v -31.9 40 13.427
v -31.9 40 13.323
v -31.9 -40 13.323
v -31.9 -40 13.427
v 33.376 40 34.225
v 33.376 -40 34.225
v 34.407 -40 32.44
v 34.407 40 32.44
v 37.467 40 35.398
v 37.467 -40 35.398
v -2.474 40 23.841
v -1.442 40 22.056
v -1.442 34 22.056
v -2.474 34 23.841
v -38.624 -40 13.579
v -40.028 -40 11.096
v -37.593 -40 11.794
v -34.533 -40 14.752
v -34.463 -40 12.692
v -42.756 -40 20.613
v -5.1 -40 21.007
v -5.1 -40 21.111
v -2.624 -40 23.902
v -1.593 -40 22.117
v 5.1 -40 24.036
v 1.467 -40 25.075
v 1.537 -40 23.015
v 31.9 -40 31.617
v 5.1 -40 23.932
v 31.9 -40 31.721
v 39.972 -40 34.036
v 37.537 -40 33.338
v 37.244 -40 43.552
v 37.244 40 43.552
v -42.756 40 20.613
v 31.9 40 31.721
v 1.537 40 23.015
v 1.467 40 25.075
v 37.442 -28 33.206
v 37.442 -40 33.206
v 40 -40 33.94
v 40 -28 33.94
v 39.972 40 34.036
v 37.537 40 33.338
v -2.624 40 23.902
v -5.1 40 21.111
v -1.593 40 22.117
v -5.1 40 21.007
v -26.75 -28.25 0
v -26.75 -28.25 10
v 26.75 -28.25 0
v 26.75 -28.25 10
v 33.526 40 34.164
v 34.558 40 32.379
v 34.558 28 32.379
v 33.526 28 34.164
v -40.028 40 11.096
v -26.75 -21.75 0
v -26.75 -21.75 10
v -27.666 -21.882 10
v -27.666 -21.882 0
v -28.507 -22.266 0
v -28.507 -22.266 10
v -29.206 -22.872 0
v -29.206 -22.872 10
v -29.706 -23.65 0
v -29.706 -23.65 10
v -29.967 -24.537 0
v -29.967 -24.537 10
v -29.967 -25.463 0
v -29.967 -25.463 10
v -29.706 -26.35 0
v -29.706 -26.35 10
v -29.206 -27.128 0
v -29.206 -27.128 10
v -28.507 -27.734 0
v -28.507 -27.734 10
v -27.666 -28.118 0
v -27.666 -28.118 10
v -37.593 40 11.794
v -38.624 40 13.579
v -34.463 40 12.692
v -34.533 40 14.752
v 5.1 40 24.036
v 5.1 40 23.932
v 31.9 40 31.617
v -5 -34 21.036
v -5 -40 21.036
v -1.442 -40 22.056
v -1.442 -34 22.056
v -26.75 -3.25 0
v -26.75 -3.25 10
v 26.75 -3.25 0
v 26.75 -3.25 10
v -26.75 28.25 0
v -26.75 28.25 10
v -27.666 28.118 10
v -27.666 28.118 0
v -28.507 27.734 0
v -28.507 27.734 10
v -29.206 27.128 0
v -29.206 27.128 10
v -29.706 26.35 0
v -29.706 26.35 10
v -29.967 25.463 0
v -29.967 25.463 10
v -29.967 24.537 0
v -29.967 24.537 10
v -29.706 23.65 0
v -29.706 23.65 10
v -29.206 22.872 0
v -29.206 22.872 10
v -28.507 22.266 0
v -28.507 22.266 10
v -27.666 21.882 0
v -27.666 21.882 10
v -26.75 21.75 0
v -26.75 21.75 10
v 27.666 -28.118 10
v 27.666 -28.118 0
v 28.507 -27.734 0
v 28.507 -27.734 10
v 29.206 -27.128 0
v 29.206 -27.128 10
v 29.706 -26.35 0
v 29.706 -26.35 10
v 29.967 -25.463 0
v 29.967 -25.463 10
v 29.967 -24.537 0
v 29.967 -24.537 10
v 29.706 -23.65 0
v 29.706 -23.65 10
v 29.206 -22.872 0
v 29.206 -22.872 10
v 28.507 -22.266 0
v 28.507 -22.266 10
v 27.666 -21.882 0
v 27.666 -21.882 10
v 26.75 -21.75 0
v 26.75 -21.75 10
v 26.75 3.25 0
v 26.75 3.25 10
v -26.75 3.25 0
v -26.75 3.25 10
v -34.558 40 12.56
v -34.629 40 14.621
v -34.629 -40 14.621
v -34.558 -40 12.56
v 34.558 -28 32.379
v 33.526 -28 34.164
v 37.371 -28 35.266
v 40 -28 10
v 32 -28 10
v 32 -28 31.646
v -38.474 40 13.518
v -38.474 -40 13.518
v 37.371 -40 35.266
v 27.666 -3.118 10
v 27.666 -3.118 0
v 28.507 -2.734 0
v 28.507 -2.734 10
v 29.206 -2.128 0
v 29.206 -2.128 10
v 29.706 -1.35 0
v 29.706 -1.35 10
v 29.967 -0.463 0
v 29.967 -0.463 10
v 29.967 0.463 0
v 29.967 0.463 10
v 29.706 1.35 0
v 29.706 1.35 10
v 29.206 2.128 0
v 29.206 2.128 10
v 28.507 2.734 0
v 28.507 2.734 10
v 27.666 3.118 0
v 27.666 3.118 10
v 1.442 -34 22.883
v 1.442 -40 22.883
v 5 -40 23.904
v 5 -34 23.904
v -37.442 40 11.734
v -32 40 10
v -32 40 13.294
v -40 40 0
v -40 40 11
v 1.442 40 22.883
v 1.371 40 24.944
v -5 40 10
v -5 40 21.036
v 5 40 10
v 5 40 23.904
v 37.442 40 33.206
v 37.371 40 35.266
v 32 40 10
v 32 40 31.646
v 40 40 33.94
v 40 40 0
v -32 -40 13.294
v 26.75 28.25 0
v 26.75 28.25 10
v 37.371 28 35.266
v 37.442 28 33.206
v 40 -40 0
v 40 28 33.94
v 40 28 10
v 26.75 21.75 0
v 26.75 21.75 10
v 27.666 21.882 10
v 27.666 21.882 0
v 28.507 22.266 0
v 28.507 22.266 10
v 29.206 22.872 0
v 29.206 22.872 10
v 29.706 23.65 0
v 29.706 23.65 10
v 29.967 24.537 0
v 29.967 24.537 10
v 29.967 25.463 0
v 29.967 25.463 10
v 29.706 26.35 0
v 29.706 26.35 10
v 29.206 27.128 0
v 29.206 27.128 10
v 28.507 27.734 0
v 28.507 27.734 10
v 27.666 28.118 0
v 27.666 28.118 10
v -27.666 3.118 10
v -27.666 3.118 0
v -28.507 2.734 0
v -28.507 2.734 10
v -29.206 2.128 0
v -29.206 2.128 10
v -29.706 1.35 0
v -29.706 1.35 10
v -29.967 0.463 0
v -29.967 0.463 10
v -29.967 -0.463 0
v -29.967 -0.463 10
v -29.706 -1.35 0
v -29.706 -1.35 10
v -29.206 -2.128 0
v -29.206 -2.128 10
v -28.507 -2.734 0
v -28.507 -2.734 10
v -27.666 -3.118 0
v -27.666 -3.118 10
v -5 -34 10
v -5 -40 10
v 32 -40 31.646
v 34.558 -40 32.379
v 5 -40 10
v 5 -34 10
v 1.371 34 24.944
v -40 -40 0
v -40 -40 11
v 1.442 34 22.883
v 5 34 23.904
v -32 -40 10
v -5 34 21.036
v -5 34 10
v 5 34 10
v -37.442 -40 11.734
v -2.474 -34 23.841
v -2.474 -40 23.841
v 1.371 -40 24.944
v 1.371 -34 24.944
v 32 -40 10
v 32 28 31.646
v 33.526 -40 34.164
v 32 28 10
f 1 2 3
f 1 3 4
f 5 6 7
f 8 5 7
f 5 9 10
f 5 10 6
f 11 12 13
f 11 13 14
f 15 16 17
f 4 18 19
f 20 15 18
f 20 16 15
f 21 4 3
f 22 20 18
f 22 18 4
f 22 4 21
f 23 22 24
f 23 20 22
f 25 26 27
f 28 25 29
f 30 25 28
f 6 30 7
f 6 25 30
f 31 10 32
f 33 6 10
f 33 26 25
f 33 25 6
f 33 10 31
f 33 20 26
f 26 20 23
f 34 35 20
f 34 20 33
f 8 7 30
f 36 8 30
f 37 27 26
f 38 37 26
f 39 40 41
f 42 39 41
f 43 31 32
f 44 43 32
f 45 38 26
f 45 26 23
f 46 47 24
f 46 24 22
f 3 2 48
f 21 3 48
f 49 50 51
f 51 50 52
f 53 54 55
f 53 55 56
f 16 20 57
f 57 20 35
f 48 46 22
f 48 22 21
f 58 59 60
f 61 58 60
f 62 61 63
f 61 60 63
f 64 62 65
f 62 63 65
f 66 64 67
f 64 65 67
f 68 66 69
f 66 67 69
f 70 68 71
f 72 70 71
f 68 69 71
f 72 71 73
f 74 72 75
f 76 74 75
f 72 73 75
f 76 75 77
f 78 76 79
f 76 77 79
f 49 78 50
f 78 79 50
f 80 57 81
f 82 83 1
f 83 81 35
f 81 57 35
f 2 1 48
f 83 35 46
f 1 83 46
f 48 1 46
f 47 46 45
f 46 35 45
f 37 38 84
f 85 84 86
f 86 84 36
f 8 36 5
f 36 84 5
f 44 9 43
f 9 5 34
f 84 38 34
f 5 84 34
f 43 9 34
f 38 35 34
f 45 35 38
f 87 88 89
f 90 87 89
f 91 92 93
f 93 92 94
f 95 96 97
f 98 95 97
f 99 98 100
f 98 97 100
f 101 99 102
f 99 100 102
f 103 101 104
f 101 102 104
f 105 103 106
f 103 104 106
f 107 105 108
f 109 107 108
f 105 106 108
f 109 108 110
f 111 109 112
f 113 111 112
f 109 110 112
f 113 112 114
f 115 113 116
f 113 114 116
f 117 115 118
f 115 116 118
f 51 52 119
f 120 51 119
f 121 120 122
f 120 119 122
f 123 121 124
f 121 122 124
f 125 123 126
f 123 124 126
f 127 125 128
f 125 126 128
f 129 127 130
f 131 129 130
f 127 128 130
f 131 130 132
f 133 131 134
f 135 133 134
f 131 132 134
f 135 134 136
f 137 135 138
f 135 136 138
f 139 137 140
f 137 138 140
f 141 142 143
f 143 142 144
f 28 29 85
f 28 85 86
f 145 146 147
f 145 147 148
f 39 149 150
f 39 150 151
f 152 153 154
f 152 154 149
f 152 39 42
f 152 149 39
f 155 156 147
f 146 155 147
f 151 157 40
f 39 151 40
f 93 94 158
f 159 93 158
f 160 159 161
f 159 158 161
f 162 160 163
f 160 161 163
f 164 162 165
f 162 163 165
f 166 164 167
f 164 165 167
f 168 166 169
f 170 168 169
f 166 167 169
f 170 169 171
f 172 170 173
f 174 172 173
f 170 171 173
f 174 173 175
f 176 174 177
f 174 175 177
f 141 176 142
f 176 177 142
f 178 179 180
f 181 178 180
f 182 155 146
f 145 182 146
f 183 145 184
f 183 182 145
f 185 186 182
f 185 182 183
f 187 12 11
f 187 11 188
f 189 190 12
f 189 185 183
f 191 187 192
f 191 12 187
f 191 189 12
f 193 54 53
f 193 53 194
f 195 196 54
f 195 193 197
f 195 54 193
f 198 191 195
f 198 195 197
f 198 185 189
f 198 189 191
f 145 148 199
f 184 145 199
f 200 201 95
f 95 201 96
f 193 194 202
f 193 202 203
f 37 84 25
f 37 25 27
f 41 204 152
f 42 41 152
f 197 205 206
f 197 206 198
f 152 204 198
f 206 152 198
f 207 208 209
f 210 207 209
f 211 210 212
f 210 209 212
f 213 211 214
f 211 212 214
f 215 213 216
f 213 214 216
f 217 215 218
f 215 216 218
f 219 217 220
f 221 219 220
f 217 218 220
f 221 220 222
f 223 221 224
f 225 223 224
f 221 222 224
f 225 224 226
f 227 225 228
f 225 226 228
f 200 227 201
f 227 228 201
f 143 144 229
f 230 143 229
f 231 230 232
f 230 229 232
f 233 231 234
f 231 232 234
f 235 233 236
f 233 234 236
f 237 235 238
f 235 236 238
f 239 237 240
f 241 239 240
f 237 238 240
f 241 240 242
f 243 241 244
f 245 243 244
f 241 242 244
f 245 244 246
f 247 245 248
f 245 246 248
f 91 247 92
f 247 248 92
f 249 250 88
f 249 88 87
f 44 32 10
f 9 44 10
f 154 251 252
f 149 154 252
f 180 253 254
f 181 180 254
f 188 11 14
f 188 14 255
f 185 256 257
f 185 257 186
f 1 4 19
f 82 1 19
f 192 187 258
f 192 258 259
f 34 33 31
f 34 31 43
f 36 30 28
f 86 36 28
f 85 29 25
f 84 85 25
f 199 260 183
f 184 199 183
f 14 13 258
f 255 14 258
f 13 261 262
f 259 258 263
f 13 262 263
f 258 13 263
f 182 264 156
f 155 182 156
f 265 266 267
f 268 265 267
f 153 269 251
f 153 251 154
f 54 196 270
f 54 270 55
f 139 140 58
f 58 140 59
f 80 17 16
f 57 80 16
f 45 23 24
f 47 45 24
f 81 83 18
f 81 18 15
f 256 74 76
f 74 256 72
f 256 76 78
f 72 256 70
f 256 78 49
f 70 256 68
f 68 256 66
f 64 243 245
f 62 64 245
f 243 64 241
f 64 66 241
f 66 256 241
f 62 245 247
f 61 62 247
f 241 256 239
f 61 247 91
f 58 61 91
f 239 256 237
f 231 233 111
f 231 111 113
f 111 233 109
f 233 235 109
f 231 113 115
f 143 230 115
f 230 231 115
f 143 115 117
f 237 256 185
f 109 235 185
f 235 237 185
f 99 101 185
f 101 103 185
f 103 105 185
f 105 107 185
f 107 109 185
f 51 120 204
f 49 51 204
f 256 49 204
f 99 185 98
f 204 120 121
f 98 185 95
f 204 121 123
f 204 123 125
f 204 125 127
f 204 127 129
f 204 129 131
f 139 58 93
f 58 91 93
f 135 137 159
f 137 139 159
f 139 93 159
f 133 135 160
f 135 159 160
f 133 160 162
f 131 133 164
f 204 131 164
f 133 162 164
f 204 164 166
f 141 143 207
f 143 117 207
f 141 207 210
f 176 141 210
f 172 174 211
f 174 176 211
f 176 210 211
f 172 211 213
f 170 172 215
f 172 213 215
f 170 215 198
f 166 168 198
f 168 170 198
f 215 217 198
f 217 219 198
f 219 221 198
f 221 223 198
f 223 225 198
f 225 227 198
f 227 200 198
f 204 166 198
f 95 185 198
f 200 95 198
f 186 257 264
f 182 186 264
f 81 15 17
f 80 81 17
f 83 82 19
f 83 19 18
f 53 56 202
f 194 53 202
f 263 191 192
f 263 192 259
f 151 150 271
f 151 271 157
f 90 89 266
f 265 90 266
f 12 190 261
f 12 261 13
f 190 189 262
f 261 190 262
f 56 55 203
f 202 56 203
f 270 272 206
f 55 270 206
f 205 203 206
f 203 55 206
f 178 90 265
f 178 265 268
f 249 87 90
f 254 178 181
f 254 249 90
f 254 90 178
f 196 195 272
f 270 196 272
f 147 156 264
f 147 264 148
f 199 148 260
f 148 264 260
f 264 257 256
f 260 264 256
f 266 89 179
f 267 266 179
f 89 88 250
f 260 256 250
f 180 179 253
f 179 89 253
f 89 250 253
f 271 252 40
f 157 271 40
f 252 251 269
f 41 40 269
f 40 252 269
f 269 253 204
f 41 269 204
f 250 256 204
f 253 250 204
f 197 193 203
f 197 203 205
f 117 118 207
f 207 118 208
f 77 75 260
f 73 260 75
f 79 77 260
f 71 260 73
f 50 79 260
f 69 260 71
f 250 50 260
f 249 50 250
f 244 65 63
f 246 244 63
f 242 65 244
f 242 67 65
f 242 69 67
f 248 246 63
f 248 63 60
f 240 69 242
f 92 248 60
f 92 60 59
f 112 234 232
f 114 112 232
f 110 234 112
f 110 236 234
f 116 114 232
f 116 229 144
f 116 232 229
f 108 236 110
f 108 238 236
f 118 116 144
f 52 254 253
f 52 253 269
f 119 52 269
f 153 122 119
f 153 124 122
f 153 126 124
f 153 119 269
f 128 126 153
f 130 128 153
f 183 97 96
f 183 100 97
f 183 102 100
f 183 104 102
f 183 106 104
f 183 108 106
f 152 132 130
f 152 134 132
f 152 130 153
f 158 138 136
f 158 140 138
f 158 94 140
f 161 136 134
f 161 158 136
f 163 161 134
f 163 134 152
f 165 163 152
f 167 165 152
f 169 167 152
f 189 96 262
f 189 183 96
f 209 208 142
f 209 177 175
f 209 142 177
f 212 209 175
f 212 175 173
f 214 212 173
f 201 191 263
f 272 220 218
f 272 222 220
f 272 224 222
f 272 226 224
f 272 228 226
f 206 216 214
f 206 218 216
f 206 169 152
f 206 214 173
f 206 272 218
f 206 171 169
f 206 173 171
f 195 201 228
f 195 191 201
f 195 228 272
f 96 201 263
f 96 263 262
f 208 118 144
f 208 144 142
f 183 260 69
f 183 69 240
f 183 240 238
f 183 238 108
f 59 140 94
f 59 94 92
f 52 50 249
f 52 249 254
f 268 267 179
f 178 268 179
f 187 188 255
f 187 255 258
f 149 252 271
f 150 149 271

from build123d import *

# Parameters (mm, degrees)
F0_W      = 80
F0_H      = 80
F1_DEPTH  = 10
F3_DEPTH  = 10
F4_W      = 8
F4_H      = 80
F4_W_2    = 10
F4_H_2    = 6
F4_H_3    = 12
F5_DEPTH  = 80
F7_DEPTH  = 80.001
F10_W     = 83.2239548689
F10_H     = 80
F11_DEPTH = 10
F13_DEPTH = 80.001


with BuildPart() as f1:
    # F0 (on Top) → F1 (new body)
    with BuildSketch(Plane.XY):
        Rectangle(F0_W, F0_H)
    extrude(amount=F1_DEPTH)

    # F2 (on face) → F3 (cut, through all)
    with BuildSketch(Plane.XY.offset(10)):
        with BuildLine():
            ThreePointArc((-26.75, 28.25), (-30, 25), (-26.75, 21.75))
            Line((-26.75, 21.75), (26.75, 21.75))
            ThreePointArc((26.75, 21.75), (30, 25), (26.75, 28.25))
            Line((26.75, 28.25), (-26.75, 28.25))
        make_face()
        with BuildLine():
            Line((26.75, 3.25), (-26.75, 3.25))
            ThreePointArc((-26.75, 3.25), (-30, 0), (-26.75, -3.25))
            Line((-26.75, -3.25), (26.75, -3.25))
            ThreePointArc((26.75, -3.25), (30, 0), (26.75, 3.25))
        make_face()
        with BuildLine():
            Line((26.75, -21.75), (-26.75, -21.75))
            ThreePointArc((-26.75, -21.75), (-30, -25), (-26.75, -28.25))
            Line((-26.75, -28.25), (26.75, -28.25))
            ThreePointArc((26.75, -28.25), (30, -25), (26.75, -21.75))
        make_face()
    extrude(amount=-F3_DEPTH, mode=Mode.SUBTRACT)

    # F4 (on face) → F5 (join)
    with BuildSketch(Plane.XY.offset(10)):
        with Locations((-36, 0)):
            Rectangle(F4_W, F4_H)
        with Locations((0, -37)):
            Rectangle(F4_W_2, F4_H_2)
        with Locations((36, -34)):
            Rectangle(F4_W, F4_H_3)
    extrude(amount=F5_DEPTH)

    # F6 (on face) → F7 (cut, through all)
    with BuildSketch(Plane.XZ.offset(40)):
        Polygon((40, 33.9396308607), (62.9050343134, 40.5075437607), (62.9050343134, 116.6192118451), (-43.2359185175, 116.6192118451), (-43.4874144438, 10), (-40, 11), (-37.4418925439, 11.7335255093), (-38.4737981035, 13.5182302233), (-34.6287513198, 14.6207796465), (-34.5581074561, 12.5604375768), (-32, 13.2939630861), (-5, 21.0360885016), (-1.4418925439, 22.0563593966), (-2.4737981035, 23.8410641106), (1.3712486802, 24.9436135339), (1.4418925439, 22.8832714641), (5, 23.9035423591), (32, 31.6456677746), (34.5581074561, 32.3791932839), (33.5262018965, 34.1638979979), (37.3712486802, 35.2664474212), (37.4418925439, 33.2061053514), align=None)
    extrude(amount=-F7_DEPTH, mode=Mode.SUBTRACT)

    # F8: F1 across plane


with BuildPart() as f1_1:
    add(f1.part)
    add(f1.part.mirror(Plane.XZ))


with BuildPart() as f11:
    # F10 (on offset) → F11 (new body, through all)
    with BuildSketch(Plane(origin=(-8.7099675883, 0, 30.3752667729), x_dir=(0.9612616959, 0, 0.2756373558), z_dir=(-0.2756373558, 0, 0.9612616959))):
        with Locations((6.1935205109, 0)):
            Rectangle(F10_W, F10_H)
    extrude(amount=-F11_DEPTH)

    # F12 (on face) → F13 (cut, through all)
    with BuildSketch(Plane.XZ.offset(40)):
        Polygon((-1.5925724095, 22.117182584), (-5.1, 21.1114439066), (-5.1, 10.1), (-31.9, 10.1), (-31.9, 13.4266675682), (-34.4625550616, 12.6918667286), (-34.5331989253, 14.7522087983), (-38.6244779691, 13.5790534107), (-37.5925724095, 11.7943486967), (-40.1, 11.075355405), (-40.1, -0.1), (40.1, -0.1), (40.1, 34.0723353429), (37.5374449384, 33.3375345032), (37.4668010747, 35.397876573), (33.3755220309, 34.2247211853), (34.4074275905, 32.4400164713), (31.9, 31.7210231796), (31.9, 10.1), (5.1, 10.1), (5.1, 24.0362468413), (1.5374449384, 23.0147006159), (1.4668010747, 25.0750426857), (-2.6244779691, 23.901887298), align=None)
    extrude(amount=-F13_DEPTH, mode=Mode.SUBTRACT)


solid = Compound([f1_1.part, f11.part])
